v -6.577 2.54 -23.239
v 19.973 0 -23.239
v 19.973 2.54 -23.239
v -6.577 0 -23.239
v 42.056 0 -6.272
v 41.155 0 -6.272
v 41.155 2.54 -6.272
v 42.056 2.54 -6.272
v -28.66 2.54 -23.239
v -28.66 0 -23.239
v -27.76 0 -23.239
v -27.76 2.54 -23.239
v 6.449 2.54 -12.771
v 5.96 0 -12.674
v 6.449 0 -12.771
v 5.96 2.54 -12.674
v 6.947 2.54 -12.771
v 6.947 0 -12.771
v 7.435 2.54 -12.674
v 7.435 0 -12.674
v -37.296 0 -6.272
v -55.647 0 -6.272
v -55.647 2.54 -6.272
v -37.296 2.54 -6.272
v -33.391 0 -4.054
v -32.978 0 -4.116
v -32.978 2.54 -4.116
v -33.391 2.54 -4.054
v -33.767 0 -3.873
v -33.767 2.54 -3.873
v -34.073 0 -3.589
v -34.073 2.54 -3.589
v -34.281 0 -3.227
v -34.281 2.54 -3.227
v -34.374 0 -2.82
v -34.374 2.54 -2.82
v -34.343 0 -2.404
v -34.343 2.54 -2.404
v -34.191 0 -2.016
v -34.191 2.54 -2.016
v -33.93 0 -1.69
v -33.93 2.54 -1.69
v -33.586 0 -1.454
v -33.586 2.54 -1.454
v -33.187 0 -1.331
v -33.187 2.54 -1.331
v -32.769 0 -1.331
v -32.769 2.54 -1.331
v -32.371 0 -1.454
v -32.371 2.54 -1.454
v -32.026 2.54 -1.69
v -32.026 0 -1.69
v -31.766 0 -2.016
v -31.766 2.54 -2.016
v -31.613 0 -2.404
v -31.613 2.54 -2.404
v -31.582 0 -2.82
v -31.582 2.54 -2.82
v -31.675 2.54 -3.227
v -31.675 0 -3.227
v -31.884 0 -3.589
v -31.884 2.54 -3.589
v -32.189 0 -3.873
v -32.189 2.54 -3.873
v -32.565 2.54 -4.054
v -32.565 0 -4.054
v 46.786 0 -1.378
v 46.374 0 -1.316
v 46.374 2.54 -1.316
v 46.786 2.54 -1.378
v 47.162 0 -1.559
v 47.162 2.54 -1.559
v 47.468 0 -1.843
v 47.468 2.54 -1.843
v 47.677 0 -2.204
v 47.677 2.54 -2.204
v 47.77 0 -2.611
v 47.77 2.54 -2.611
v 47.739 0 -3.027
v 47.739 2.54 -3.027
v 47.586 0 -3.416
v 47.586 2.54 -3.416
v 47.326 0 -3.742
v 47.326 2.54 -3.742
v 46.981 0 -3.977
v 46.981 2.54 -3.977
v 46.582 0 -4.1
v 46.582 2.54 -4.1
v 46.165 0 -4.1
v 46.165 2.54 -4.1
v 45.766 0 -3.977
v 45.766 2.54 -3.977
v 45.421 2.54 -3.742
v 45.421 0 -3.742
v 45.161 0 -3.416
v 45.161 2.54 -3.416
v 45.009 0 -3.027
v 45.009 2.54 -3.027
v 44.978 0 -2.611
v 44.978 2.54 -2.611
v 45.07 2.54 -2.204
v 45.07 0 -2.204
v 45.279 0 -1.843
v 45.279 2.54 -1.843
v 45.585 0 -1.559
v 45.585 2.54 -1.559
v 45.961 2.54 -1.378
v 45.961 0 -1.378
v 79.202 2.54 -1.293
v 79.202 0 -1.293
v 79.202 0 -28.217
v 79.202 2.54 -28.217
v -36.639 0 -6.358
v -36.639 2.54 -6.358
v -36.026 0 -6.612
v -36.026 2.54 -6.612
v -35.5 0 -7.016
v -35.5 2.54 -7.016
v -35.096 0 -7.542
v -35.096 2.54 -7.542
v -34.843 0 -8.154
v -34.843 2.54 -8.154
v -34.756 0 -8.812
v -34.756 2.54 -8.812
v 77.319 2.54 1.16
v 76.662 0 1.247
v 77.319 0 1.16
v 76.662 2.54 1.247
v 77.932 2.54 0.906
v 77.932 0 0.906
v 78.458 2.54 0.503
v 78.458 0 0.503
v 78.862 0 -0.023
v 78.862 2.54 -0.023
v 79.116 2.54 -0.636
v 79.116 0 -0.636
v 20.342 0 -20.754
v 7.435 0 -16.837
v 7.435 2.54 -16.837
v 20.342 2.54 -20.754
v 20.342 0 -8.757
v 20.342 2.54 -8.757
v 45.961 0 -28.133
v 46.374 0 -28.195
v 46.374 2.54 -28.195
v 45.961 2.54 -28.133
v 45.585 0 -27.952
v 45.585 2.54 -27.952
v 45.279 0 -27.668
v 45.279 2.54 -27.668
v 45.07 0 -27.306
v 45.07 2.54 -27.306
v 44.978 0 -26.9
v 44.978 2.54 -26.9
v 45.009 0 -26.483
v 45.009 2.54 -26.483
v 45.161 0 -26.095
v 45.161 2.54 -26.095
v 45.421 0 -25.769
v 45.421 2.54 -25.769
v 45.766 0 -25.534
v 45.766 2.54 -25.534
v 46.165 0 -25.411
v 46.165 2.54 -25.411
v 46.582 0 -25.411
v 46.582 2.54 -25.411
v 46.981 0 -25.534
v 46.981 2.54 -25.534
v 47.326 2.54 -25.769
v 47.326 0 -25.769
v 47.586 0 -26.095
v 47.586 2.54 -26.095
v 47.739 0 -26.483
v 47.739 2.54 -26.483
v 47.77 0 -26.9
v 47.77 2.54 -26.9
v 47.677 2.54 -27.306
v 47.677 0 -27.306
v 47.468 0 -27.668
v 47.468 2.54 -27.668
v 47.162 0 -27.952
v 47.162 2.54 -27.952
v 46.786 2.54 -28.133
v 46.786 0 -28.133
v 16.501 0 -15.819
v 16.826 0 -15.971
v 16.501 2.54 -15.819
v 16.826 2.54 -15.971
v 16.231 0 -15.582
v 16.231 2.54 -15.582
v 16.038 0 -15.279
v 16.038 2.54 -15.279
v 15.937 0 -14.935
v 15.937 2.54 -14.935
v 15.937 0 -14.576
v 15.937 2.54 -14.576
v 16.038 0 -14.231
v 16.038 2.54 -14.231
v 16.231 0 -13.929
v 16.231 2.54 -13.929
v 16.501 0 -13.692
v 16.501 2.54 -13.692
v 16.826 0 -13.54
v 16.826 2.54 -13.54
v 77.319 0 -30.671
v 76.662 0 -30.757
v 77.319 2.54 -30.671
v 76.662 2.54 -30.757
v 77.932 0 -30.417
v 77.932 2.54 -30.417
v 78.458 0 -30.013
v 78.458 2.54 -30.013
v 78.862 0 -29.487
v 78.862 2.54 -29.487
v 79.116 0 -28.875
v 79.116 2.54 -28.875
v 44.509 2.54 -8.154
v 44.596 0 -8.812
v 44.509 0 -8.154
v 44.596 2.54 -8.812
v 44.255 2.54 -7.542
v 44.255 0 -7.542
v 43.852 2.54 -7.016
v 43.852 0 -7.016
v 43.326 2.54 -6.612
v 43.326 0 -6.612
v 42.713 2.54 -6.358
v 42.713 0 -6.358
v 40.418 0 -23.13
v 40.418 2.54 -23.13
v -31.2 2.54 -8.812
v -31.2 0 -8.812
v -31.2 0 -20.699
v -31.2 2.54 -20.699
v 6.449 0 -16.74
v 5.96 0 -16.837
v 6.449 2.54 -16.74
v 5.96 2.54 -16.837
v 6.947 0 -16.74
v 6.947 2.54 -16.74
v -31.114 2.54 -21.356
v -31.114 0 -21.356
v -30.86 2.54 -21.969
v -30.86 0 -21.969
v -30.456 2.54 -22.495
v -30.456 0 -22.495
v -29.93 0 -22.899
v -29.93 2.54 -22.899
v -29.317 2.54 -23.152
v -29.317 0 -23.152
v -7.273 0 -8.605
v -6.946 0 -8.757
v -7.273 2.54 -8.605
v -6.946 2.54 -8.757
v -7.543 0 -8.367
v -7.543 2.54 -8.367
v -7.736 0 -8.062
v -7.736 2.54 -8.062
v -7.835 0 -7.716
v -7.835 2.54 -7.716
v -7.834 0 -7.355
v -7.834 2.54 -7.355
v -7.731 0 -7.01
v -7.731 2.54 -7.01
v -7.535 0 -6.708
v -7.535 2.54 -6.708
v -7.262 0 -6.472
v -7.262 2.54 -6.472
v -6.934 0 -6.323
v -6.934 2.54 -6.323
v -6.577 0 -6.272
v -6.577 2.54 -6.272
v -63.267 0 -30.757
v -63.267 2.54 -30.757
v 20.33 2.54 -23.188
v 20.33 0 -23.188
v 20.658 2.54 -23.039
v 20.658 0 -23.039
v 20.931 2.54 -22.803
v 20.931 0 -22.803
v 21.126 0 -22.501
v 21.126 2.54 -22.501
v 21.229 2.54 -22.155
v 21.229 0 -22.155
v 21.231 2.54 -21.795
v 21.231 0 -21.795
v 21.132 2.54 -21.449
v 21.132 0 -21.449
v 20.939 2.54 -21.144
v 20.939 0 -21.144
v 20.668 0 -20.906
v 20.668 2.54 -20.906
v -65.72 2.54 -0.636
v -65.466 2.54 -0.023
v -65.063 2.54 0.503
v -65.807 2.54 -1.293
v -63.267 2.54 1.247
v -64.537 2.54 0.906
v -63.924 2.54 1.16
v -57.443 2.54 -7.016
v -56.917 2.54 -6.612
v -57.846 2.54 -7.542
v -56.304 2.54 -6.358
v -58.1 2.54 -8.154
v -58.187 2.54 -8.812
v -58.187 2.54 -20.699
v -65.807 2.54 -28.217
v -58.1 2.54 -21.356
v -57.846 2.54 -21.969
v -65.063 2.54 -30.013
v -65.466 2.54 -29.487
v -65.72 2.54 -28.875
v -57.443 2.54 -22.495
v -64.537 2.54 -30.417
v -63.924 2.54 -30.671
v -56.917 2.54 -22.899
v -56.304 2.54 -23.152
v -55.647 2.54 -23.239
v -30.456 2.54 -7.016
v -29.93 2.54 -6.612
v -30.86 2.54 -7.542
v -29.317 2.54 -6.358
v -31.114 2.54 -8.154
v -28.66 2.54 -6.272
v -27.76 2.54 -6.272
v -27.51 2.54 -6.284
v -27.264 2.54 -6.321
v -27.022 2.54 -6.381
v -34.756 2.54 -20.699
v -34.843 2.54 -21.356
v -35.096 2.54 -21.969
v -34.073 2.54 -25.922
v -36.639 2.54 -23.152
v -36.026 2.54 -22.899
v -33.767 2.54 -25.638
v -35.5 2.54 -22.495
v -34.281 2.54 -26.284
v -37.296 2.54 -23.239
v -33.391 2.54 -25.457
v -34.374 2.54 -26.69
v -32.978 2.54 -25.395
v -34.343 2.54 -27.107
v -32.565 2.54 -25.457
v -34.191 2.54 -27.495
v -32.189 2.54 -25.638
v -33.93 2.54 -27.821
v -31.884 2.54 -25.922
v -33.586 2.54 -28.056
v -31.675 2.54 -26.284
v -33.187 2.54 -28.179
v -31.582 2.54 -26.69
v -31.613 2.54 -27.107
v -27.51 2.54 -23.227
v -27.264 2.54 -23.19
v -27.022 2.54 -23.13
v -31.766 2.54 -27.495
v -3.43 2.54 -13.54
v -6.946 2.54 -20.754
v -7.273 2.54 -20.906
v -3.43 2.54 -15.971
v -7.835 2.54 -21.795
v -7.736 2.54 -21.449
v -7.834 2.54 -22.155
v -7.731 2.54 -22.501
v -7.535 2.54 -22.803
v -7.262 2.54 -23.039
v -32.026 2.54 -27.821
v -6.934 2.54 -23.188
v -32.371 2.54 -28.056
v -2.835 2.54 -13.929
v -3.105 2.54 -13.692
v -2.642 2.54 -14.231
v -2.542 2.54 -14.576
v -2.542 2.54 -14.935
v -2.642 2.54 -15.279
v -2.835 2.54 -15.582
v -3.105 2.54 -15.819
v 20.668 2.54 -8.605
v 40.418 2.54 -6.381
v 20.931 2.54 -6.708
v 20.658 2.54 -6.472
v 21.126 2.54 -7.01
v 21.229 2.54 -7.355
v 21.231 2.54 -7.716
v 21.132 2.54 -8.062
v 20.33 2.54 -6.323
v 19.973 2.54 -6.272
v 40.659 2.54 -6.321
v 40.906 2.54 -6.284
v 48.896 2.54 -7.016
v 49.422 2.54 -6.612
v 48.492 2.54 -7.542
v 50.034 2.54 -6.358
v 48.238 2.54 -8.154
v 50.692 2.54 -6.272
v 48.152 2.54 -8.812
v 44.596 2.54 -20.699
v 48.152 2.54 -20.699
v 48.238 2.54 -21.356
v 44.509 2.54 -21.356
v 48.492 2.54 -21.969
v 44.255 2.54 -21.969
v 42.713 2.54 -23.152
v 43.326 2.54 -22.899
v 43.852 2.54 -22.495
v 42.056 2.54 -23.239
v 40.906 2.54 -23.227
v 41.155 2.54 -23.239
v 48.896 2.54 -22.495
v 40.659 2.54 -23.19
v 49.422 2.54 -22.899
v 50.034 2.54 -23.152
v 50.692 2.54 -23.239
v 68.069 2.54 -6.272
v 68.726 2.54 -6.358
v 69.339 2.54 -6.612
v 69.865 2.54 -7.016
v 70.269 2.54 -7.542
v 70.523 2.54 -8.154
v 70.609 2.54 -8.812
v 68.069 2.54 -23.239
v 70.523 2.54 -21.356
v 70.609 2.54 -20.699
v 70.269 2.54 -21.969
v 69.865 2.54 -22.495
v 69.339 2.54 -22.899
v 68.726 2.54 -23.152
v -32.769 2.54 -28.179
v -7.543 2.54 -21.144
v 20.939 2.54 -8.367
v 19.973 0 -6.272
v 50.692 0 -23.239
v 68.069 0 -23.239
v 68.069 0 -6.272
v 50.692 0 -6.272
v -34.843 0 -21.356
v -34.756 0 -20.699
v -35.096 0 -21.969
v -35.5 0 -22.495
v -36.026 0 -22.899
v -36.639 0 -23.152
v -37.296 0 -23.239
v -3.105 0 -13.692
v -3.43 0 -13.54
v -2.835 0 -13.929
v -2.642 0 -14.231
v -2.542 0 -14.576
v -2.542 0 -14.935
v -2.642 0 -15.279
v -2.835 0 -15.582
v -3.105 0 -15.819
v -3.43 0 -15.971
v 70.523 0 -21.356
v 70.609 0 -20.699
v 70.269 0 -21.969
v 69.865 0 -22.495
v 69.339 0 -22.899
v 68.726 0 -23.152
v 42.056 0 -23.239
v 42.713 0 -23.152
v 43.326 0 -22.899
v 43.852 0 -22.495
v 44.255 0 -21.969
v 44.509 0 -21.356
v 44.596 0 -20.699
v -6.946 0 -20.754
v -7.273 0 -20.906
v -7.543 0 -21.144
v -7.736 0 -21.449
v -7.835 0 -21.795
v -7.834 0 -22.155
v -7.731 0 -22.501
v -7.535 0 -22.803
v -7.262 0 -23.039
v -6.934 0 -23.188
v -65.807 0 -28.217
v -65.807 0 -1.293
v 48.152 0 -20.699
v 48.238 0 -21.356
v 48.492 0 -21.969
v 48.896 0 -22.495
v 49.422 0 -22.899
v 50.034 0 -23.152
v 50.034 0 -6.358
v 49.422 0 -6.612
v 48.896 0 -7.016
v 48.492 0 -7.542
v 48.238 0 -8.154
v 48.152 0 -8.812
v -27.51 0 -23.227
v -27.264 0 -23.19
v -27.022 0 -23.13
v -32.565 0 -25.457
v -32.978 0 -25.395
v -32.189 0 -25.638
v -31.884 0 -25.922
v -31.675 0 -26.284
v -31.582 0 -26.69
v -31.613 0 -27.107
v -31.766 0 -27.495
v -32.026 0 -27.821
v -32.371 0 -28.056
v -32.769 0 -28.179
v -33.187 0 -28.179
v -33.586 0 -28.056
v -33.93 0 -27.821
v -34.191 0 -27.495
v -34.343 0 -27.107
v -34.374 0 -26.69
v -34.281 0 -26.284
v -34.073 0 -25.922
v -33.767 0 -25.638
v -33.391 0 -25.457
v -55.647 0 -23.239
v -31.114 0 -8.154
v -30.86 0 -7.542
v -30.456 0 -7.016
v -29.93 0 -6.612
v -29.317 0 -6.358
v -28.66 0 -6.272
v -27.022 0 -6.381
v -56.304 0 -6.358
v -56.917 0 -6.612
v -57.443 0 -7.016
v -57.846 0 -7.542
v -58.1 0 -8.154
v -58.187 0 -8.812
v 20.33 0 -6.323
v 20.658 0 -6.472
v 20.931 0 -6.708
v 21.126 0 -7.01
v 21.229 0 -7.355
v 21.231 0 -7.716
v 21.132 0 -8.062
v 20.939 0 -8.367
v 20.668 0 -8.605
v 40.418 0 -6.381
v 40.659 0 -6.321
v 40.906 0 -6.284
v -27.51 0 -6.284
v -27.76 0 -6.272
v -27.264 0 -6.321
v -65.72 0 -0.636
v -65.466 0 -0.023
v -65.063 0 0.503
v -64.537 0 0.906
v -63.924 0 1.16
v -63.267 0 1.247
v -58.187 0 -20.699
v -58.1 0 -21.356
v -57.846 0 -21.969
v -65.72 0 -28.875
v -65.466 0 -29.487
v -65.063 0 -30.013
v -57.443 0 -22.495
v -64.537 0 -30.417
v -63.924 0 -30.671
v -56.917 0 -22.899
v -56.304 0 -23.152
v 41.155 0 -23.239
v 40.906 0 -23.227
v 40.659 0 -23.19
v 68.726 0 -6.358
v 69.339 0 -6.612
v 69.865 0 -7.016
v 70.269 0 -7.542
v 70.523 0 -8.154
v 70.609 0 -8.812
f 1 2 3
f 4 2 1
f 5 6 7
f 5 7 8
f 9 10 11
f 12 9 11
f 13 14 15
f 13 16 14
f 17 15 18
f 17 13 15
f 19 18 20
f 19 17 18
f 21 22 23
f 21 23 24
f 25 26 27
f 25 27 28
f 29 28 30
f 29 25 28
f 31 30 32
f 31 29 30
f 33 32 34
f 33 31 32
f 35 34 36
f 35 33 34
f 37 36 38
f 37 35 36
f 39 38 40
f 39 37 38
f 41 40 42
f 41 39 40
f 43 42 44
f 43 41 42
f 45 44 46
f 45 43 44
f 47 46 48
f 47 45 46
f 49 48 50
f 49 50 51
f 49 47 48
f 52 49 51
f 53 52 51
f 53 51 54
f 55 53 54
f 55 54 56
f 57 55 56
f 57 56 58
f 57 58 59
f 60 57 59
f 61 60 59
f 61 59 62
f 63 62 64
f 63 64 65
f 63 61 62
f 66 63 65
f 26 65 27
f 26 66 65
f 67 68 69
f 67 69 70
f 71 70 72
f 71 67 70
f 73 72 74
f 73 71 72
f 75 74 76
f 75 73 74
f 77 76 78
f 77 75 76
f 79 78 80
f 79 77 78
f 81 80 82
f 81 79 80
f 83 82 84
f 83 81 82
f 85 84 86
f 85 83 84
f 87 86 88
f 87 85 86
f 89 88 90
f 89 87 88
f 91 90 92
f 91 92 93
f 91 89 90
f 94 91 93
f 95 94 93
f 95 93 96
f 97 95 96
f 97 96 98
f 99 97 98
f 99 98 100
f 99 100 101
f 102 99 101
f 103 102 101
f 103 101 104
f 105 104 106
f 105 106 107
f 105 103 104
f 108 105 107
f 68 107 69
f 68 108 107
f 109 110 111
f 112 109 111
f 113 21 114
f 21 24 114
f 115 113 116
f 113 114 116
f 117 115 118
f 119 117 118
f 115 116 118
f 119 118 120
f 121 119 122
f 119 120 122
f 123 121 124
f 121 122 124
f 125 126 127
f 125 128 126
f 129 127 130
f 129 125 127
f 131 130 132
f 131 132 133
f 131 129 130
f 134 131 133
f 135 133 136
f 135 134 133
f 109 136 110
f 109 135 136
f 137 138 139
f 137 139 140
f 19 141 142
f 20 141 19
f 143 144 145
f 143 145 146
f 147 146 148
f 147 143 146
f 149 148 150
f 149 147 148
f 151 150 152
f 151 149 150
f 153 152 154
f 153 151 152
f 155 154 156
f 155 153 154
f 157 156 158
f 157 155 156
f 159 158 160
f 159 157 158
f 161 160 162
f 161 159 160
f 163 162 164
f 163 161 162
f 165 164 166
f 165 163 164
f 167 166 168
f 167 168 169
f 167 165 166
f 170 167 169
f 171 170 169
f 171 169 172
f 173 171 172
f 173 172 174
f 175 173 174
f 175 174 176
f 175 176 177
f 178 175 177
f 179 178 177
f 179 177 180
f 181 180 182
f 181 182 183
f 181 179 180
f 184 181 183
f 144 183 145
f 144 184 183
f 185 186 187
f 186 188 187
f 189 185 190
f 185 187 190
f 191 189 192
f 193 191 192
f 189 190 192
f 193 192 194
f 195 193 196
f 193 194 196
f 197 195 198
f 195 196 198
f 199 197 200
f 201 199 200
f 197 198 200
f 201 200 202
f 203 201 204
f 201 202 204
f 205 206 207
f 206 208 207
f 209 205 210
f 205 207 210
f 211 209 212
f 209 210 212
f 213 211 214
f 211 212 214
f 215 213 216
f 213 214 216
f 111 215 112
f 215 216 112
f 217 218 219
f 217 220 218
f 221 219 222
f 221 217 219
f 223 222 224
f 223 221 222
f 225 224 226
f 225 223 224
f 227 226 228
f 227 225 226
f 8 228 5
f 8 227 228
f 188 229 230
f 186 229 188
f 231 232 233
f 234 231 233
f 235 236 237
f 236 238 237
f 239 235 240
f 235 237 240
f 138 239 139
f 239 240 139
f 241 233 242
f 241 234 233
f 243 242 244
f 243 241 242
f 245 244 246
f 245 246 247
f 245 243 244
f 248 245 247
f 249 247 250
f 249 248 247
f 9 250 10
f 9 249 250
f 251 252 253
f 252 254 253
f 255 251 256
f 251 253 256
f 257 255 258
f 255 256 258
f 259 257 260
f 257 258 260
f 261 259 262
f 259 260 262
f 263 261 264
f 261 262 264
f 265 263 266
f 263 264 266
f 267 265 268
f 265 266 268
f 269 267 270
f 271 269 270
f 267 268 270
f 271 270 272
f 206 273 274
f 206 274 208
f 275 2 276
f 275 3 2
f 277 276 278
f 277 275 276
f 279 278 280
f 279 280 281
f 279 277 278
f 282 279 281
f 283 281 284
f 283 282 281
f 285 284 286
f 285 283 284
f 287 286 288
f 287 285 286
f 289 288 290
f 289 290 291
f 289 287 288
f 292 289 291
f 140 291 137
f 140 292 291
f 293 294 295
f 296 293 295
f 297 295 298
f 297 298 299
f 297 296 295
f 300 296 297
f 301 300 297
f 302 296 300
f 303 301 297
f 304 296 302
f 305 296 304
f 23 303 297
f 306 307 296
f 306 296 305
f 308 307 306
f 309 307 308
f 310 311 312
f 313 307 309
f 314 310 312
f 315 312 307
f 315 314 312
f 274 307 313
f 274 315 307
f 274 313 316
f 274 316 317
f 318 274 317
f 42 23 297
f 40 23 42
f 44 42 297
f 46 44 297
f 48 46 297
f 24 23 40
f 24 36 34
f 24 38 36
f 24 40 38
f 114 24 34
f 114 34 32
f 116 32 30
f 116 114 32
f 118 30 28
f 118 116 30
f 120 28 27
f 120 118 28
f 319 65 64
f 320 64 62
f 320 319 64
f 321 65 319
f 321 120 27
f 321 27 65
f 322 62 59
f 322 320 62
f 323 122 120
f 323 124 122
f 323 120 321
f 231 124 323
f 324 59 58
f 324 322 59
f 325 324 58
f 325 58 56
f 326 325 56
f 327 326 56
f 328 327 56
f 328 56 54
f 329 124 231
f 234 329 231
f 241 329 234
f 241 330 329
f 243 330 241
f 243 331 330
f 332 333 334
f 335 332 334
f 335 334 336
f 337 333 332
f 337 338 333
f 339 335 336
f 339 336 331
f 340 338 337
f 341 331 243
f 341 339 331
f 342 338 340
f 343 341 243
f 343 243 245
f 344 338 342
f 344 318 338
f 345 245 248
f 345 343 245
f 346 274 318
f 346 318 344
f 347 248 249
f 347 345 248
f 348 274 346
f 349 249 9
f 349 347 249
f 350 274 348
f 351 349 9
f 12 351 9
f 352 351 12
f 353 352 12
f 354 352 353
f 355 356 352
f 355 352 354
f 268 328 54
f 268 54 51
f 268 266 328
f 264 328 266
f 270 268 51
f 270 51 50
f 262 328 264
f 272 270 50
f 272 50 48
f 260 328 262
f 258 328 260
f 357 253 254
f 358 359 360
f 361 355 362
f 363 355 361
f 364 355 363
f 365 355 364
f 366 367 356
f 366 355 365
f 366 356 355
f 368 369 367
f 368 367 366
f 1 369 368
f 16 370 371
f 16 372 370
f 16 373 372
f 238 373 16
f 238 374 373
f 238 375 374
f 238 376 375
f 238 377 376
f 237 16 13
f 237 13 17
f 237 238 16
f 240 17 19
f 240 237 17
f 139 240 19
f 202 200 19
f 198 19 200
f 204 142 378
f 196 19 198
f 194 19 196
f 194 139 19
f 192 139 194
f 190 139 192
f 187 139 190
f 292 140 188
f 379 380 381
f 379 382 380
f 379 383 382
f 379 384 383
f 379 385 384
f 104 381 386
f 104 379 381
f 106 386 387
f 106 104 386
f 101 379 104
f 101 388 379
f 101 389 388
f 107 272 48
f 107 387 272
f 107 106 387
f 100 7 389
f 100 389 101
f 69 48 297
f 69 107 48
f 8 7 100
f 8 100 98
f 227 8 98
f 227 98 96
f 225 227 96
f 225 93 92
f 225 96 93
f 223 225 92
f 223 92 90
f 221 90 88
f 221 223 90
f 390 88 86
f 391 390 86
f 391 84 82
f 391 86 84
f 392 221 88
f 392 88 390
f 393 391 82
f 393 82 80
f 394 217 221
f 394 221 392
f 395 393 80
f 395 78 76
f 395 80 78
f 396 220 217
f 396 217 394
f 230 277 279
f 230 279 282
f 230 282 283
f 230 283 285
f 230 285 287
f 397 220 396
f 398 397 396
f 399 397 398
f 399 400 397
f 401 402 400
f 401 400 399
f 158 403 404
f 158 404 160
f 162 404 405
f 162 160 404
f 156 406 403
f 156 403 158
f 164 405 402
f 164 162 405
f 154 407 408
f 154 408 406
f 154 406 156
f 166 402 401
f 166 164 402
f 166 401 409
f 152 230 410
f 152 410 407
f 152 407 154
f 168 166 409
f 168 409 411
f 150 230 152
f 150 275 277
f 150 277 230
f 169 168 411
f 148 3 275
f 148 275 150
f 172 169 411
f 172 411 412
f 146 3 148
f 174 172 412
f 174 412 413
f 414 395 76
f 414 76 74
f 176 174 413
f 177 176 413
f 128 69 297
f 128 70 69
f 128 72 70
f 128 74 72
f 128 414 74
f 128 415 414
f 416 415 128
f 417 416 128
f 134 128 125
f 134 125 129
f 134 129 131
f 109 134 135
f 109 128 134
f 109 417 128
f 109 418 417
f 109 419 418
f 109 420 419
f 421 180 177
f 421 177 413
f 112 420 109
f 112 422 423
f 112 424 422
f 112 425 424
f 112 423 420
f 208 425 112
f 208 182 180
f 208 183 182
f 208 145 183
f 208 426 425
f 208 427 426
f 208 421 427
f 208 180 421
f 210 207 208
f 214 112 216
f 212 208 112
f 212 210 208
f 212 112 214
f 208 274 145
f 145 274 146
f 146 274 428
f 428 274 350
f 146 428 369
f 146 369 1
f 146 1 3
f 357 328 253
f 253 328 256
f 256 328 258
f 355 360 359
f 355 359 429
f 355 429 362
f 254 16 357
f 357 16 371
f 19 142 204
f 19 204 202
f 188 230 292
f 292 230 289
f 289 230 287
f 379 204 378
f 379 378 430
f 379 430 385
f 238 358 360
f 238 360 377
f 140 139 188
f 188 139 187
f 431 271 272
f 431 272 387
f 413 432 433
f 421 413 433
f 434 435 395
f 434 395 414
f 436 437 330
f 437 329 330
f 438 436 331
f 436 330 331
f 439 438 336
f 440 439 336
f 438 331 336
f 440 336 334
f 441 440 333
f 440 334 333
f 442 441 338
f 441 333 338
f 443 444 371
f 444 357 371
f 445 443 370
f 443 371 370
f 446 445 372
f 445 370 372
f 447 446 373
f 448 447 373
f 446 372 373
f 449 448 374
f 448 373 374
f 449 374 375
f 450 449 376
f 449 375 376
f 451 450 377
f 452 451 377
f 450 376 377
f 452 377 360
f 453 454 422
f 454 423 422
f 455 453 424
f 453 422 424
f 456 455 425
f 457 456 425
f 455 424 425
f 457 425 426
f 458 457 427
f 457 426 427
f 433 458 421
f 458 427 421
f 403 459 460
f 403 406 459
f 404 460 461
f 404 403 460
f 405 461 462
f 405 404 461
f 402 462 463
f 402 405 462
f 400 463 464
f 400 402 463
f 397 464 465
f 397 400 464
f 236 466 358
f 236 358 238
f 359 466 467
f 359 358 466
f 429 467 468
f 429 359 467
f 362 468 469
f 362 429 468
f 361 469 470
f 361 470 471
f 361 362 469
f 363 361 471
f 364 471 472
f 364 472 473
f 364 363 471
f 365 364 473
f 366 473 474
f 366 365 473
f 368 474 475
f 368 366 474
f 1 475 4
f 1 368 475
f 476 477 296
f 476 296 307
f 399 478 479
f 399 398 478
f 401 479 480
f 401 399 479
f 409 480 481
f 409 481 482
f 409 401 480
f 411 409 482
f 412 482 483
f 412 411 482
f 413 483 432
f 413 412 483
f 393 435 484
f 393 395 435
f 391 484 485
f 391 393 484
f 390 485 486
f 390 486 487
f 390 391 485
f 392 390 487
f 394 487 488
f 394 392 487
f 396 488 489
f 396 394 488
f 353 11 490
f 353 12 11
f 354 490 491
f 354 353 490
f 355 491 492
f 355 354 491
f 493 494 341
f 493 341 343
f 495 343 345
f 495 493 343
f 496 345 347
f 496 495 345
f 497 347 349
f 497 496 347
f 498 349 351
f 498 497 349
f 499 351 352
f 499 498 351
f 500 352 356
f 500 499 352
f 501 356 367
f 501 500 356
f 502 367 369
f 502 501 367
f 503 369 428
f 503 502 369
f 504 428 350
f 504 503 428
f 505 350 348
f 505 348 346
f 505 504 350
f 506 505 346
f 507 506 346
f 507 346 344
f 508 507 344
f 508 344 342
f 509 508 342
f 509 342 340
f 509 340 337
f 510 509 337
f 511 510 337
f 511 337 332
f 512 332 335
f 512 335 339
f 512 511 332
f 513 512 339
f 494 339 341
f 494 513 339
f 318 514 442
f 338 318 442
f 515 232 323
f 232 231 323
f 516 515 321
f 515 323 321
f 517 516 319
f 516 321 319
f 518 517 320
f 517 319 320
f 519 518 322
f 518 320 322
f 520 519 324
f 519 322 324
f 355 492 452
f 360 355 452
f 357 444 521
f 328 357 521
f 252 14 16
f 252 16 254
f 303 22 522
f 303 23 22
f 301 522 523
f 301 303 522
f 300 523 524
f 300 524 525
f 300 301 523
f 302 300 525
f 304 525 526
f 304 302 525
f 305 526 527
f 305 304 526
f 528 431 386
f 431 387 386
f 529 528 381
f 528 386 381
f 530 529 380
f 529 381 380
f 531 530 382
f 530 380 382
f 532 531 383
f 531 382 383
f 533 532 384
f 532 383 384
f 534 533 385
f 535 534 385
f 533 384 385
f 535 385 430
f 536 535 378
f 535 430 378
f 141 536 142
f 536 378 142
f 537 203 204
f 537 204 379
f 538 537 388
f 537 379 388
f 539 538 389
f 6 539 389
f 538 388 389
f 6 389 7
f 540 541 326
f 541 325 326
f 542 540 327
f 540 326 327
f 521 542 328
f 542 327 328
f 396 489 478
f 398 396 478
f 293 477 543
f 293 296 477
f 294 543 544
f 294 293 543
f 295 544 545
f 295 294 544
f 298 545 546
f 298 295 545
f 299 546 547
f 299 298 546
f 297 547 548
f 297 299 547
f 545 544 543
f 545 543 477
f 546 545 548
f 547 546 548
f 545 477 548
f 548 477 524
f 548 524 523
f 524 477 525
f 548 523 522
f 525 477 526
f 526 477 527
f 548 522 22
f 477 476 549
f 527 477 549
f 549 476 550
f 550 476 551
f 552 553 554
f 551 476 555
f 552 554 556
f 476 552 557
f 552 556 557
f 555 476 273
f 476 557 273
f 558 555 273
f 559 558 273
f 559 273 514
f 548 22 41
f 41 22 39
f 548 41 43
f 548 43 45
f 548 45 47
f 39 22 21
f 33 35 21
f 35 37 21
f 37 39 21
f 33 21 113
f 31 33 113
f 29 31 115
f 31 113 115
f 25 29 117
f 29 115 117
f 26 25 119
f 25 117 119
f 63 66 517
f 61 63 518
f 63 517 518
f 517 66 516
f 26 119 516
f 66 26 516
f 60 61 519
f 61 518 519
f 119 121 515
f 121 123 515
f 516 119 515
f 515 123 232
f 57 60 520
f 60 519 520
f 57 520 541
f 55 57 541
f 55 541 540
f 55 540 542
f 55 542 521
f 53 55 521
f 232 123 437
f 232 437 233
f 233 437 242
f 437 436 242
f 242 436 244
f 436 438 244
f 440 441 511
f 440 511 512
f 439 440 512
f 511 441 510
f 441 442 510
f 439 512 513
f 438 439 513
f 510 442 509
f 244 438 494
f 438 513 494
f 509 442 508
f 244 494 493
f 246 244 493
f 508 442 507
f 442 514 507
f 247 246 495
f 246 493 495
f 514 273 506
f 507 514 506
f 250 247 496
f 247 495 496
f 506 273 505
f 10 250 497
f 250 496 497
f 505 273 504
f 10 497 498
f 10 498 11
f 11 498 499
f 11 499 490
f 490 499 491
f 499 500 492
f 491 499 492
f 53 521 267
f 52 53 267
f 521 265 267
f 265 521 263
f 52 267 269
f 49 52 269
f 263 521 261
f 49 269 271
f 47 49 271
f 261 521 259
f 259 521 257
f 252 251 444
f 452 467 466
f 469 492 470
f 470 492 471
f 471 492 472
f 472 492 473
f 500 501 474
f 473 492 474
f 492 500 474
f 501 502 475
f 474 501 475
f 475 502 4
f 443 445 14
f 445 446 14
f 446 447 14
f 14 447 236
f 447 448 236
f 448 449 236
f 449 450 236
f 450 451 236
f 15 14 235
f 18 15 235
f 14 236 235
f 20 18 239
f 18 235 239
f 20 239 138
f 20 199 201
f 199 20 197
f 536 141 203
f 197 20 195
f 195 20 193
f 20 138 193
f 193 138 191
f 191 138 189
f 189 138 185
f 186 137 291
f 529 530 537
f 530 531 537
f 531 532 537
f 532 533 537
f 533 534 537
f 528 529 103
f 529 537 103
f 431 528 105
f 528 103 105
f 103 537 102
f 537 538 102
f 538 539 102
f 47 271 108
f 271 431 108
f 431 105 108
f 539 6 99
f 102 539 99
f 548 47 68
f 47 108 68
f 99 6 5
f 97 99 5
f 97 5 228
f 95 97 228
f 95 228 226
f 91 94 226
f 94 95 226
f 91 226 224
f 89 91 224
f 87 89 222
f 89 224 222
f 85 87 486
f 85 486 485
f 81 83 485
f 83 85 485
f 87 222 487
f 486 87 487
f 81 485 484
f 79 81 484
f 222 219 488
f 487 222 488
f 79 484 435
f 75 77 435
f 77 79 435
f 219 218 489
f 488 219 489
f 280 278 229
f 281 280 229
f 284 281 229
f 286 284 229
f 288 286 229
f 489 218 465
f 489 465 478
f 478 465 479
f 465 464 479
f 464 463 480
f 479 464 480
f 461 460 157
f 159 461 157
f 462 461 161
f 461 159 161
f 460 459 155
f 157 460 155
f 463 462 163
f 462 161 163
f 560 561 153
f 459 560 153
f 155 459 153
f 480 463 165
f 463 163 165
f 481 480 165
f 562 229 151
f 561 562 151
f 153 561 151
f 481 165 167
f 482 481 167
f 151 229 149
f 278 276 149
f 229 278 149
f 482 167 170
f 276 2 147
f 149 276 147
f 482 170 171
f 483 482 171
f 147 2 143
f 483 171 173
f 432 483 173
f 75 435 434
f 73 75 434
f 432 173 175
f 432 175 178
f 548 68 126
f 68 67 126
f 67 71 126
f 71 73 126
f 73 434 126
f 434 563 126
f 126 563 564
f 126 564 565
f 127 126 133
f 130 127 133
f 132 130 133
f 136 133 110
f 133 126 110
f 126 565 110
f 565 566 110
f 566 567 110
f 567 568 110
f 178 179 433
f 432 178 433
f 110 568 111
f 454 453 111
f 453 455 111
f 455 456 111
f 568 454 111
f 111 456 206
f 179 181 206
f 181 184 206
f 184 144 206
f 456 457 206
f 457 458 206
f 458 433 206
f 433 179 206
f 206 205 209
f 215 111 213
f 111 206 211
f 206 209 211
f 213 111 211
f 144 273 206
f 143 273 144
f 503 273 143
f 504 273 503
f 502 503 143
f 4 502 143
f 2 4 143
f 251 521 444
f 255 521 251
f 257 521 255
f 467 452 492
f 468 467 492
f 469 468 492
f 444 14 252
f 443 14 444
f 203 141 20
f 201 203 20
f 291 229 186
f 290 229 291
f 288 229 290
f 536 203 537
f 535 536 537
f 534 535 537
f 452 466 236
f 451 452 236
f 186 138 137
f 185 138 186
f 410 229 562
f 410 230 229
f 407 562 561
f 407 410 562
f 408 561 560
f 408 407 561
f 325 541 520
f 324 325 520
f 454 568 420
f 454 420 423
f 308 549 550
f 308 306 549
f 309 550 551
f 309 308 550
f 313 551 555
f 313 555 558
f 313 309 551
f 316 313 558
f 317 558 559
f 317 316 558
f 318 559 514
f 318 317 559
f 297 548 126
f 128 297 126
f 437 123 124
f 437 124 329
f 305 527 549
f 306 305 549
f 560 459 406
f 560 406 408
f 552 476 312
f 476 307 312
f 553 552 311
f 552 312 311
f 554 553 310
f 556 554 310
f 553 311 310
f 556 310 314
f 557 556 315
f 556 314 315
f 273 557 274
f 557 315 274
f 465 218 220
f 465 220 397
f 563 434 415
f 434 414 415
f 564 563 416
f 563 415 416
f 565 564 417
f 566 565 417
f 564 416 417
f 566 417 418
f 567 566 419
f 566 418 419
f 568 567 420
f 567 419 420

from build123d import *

# Parameters (mm, degrees)
SKETCH1_W           = 145.0086
SKETCH1_H           = 32.004
SKETCH1_R           = 1.399999994
SKETCH1_R_2         = 1.399999995
SKETCH1_W_2         = 22.457386235
SKETCH1_H_2         = 16.9672
SKETCH1_W_3         = 23.43040653
BOSS_EXTRUDE1_DEPTH = 2.54
FILLET1_R           = 2.54
FILLET2_R           = 1.27


with BuildPart() as part:
    # Sketch1 → Boss-Extrude1 (new body)
    with BuildSketch(Plane(origin=(0, 0, 0), x_dir=(1, 0, 0), z_dir=(0, 1, 0))):
        with Locations((6.69779506, 14.755388179)):
            Rectangle(SKETCH1_W, SKETCH1_H)
        with Locations(Location((-32.97809841, 26.794988179, 0), (0, 0, 270))):
            Circle(SKETCH1_R, mode=Mode.SUBTRACT)
        with Locations(Location((46.373688528, 26.794988179, 0), (0, 0, 90))):
            Circle(SKETCH1_R_2, mode=Mode.SUBTRACT)
        with Locations(Location((46.373688528, 2.715788179, 0), (0, 0, 270))):
            Circle(SKETCH1_R_2, mode=Mode.SUBTRACT)
        with Locations(Location((-32.97809841, 2.715788179, 0), (0, 0, 90))):
            Circle(SKETCH1_R, mode=Mode.SUBTRACT)
        Polygon((-31.20009841, 23.238988179), (-27.382615546, 23.238988179), (0.574659599, 14.755388179), (-27.382615546, 6.271788179), (-31.20009841, 6.271788179), align=None, mode=Mode.SUBTRACT)
        with Locations((59.380381646, 14.755388179)):
            Rectangle(SKETCH1_W_2, SKETCH1_H_2, mode=Mode.SUBTRACT)
        with Locations((-46.471301675, 14.755388179)):
            Rectangle(SKETCH1_W_3, SKETCH1_H_2, mode=Mode.SUBTRACT)
        Polygon((40.778205663, 23.238988179), (12.820930519, 14.755388179), (40.778205663, 6.271788179), (44.595688528, 6.271788179), (44.595688528, 23.238988179), align=None, mode=Mode.SUBTRACT)
        Polygon((-15.136344626, 23.238988179), (6.697795059, 16.613445937), (28.531934744, 23.238988179), align=None, mode=Mode.SUBTRACT)
        Polygon((6.697795059, 12.897330421), (-15.136344626, 6.271788179), (28.531934744, 6.271788179), align=None, mode=Mode.SUBTRACT)
    extrude(amount=BOSS_EXTRUDE1_DEPTH)

    # Fillet1
    fillet1_edges = [part.edges().sort_by_distance(p)[0] for p in [
        (70.609074763, 1.27, -6.271788179),
        (70.609074763, 1.27, -23.238988179),
        (48.151688528, 1.27, -23.238988179),
        (48.151688528, 1.27, -6.271788179),
        (-58.18650494, 1.27, -23.238988179),
        (-58.18650494, 1.27, -6.271788179),
        (-34.75609841, 1.27, -6.271788179),
        (-34.75609841, 1.27, -23.238988179),
        (6.697795059, 1.27, -16.613445937),
        (6.697795059, 1.27, -12.897330421),
        (79.20209506, 1.27, 1.246611821),
        (-65.80650494, 1.27, 1.246611821),
        (-65.80650494, 1.27, -30.757388179),
        (79.20209506, 1.27, -30.757388179),
        (44.595688528, 1.27, -23.238988179),
        (40.778205663, 1.27, -23.238988179),
        (40.778205663, 1.27, -6.271788179),
        (44.595688528, 1.27, -6.271788179),
        (-31.20009841, 1.27, -23.238988179),
        (-31.20009841, 1.27, -6.271788179),
        (-27.382615546, 1.27, -6.271788179),
        (-27.382615546, 1.27, -23.238988179),
    ]]
    fillet(fillet1_edges, radius=FILLET1_R)

    # Fillet2
    fillet2_edges = [part.edges().sort_by_distance(p)[0] for p in [
        (28.531934744, 1.27, -23.238988179),
        (-15.136344626, 1.27, -23.238988179),
        (-15.136344626, 1.27, -6.271788179),
        (28.531934744, 1.27, -6.271788179),
        (12.820930519, 1.27, -14.755388179),
        (0.574659599, 1.27, -14.755388179),
    ]]
    fillet(fillet2_edges, radius=FILLET2_R)


solid = part.part
